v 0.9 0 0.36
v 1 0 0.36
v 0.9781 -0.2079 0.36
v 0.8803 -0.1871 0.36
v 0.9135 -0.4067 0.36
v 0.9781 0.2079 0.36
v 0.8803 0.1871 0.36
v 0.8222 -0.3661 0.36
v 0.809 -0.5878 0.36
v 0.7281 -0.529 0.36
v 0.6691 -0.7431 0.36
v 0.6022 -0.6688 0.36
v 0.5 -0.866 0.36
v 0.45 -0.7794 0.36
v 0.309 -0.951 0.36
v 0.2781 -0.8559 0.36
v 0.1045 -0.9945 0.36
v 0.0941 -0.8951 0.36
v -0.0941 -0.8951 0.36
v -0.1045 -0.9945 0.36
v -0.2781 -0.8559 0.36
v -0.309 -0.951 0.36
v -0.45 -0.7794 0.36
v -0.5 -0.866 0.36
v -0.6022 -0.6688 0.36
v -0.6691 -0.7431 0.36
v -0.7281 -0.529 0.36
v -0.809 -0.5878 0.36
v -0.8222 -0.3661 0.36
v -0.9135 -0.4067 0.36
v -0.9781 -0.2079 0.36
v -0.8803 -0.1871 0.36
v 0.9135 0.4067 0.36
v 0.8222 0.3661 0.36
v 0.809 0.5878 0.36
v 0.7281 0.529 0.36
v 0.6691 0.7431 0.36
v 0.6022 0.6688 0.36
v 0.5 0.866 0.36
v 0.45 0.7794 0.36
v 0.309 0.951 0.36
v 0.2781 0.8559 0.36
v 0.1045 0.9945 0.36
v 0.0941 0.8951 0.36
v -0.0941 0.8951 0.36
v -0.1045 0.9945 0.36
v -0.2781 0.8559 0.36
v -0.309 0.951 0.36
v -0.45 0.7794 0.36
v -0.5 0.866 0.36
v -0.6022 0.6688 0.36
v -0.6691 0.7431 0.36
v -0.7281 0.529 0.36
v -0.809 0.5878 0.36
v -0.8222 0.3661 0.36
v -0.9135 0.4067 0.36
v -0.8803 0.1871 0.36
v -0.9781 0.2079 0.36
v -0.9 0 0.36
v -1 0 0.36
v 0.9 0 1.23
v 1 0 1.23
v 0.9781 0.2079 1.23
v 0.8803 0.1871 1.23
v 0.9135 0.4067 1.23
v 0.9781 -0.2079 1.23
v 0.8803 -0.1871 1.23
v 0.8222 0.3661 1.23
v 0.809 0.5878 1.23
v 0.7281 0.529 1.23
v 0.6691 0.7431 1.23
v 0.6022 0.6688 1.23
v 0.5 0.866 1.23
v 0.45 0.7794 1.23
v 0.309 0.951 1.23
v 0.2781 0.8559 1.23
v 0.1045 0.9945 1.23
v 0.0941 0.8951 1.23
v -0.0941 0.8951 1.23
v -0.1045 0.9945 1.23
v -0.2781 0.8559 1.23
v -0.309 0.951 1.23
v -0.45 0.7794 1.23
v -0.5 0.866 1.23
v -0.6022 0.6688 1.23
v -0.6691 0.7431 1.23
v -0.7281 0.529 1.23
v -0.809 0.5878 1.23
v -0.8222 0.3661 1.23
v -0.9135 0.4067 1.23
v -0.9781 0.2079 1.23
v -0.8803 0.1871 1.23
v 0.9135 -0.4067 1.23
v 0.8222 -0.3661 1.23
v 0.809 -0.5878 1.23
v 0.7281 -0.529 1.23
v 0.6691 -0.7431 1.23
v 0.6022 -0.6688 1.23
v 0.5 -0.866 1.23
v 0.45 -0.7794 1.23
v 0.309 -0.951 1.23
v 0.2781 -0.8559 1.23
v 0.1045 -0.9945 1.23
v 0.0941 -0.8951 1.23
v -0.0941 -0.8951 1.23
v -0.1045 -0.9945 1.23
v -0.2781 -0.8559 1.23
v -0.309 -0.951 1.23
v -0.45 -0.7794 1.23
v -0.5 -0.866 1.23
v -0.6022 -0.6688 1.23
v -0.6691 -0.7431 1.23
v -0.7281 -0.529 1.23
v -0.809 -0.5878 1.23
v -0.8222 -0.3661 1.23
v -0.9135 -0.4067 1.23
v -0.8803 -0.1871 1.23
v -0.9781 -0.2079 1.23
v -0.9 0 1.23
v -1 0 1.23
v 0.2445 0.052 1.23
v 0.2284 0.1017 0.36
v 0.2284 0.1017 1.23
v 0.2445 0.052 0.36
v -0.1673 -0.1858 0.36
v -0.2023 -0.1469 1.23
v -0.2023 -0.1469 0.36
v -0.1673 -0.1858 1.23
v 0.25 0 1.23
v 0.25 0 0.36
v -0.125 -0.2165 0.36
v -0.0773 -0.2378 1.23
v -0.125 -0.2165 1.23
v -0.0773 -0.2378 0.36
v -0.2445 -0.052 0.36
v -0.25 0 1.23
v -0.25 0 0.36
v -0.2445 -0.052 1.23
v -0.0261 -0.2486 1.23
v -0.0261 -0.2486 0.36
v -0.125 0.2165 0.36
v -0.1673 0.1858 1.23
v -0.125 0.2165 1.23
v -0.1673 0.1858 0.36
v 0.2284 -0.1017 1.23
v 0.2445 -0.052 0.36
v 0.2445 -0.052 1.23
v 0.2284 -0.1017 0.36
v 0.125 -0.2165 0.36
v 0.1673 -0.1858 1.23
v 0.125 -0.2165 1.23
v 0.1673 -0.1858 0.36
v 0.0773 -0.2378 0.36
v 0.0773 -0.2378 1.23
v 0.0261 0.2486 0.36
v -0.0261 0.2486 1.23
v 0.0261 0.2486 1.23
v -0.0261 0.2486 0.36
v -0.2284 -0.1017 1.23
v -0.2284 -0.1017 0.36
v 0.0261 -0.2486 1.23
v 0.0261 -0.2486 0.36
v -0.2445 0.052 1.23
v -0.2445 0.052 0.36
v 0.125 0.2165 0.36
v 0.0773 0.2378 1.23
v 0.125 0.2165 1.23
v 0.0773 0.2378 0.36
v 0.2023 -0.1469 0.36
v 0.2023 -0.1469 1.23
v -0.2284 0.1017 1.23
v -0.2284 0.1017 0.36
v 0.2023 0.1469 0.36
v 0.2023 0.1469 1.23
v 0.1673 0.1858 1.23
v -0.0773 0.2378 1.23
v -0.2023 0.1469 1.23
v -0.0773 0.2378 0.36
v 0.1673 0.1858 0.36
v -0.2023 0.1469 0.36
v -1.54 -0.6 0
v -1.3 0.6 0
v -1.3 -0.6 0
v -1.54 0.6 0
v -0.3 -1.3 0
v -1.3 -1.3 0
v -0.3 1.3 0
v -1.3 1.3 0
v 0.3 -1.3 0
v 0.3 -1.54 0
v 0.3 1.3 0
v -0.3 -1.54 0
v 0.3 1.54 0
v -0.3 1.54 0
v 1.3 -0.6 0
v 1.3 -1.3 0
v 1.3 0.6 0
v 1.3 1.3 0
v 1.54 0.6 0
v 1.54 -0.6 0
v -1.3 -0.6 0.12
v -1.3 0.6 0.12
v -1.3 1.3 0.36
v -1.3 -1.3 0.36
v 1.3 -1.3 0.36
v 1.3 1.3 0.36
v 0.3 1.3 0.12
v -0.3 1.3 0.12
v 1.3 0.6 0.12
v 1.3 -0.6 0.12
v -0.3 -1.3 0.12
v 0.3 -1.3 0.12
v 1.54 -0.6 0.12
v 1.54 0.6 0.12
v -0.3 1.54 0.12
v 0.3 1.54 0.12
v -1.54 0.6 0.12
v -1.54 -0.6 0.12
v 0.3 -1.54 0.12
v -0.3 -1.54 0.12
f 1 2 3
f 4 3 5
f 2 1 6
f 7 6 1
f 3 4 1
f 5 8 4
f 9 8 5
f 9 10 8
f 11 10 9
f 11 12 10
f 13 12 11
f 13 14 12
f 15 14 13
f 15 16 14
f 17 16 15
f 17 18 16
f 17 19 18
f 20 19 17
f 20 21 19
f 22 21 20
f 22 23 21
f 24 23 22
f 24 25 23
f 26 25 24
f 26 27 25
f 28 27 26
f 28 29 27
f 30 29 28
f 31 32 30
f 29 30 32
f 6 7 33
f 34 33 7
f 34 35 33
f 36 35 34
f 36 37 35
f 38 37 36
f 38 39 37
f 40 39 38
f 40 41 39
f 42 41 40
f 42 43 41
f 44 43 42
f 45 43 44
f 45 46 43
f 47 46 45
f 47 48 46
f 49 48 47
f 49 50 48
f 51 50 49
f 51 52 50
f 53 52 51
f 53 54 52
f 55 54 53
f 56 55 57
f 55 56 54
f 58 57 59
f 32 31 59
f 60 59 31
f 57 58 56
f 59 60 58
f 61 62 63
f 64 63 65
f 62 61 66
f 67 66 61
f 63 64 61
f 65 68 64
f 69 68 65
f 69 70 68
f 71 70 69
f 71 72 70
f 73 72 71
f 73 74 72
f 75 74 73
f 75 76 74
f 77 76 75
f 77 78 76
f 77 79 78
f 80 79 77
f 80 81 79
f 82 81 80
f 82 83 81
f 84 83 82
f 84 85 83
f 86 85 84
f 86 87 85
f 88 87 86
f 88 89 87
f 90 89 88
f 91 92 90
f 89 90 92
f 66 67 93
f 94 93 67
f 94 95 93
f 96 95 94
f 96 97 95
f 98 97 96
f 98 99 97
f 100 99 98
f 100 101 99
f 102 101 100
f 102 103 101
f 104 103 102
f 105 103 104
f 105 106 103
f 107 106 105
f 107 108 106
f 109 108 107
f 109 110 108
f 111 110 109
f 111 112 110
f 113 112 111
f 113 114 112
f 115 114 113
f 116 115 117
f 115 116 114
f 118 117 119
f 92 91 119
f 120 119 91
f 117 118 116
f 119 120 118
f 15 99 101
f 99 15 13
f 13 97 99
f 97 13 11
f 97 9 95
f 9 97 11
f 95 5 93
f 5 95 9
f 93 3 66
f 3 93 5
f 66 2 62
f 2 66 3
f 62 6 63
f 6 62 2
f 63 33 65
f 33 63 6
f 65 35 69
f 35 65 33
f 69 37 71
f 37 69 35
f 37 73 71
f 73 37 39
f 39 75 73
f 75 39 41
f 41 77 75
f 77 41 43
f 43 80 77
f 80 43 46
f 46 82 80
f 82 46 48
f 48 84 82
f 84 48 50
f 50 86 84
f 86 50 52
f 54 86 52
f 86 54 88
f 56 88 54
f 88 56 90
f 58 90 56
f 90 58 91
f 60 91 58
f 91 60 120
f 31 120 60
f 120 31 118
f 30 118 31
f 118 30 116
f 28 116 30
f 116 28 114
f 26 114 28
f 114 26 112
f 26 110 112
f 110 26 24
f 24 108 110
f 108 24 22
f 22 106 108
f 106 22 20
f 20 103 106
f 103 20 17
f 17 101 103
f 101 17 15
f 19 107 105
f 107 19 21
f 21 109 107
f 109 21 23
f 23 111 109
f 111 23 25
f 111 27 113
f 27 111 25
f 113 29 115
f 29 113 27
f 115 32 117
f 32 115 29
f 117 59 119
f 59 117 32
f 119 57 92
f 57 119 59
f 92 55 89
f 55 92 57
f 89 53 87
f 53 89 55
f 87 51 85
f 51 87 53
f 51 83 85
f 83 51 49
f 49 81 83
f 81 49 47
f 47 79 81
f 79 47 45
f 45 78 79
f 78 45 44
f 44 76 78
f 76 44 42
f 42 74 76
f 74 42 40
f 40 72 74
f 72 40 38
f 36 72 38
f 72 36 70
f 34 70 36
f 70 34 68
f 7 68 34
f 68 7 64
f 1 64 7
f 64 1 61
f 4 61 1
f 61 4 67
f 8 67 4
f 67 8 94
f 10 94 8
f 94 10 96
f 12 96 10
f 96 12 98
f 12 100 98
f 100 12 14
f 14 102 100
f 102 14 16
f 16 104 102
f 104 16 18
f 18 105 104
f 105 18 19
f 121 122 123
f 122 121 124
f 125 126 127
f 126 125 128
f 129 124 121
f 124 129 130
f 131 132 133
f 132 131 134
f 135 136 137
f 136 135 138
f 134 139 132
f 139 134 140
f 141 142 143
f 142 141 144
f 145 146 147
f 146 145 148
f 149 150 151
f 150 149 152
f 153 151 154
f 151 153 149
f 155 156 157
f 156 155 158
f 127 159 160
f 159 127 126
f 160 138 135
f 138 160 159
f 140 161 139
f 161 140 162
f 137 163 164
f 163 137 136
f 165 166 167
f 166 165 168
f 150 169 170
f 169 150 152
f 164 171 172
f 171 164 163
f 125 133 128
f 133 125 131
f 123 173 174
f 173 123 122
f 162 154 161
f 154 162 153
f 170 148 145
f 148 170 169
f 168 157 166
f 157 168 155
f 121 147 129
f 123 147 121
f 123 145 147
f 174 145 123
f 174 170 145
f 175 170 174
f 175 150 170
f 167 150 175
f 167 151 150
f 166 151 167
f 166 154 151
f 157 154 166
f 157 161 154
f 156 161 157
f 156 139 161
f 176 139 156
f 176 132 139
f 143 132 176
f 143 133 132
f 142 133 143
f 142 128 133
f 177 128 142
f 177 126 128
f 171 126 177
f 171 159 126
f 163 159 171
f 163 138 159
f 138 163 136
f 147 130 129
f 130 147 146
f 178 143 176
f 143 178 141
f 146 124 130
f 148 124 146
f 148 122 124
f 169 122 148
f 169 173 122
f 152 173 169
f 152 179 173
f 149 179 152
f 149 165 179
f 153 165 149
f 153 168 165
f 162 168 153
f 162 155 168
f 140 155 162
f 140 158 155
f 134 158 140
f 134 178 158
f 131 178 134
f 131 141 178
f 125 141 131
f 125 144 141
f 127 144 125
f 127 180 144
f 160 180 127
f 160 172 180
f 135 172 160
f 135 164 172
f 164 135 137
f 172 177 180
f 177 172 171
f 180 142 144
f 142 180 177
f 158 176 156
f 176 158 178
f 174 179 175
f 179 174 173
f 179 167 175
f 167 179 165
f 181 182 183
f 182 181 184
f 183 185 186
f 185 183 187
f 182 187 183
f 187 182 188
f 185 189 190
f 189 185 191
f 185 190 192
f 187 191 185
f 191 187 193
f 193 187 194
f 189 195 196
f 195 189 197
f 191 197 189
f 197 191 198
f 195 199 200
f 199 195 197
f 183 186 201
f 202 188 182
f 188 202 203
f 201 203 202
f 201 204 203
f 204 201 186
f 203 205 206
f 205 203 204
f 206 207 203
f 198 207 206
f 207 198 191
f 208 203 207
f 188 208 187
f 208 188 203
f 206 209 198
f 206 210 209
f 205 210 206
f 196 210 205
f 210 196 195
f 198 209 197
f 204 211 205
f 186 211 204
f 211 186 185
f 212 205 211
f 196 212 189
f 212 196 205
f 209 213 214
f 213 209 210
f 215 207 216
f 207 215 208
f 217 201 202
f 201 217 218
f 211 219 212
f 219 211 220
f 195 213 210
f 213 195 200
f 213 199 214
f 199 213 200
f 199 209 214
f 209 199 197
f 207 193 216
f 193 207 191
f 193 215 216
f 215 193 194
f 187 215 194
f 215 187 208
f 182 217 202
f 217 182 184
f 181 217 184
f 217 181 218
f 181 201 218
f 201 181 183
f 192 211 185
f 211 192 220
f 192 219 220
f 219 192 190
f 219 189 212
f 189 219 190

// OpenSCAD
// Values taken from datasheet
// https://www.tme.eu/Document/82c09d7fbe22b420f67191e83ce17977/MX-73412-0110.pdf

CHASSIS_X_LENGTH = 2.6;
CHASSIS_Y_LENGTH =  2.6;
CHASSIS_Z_LENGTH = 0.36;

PAD_HEIGHT = 0.12;

CONNECTIOR_OUT_RING_RADIUS = 1.0;
CONNECTIOR_OUT_RING_WIDTH = 0.1;
CONNECTOR_INNER_RING_PIN_RADIUS = 0.25;

CONNECTOR_HEIGHT = 1.23 - CHASSIS_Z_LENGTH;


// Not very importnat values, no info in datasheet

// empty

// Increase steps in render to have quality circles
$fs=0.01;


module Chassis(){    
    linear_extrude(height = CHASSIS_Z_LENGTH, convexity = 10, twist = 0)  
        square([CHASSIS_X_LENGTH, CHASSIS_Y_LENGTH], center=true);
}

module outterRing(){
    linear_extrude(height = CONNECTOR_HEIGHT, convexity = 10, twist = 0)
        difference(){
            circle(r=CONNECTIOR_OUT_RING_RADIUS);
            circle(r=CONNECTIOR_OUT_RING_RADIUS - CONNECTIOR_OUT_RING_WIDTH);
        }
}

module innerRing()
{
    linear_extrude(height = CONNECTOR_HEIGHT, convexity = 10, twist = 0)
        circle(r=CONNECTOR_INNER_RING_PIN_RADIUS);
}

module Pads()
{
    PAD_TO_CENTER = 3.08/2;

    
    linear_extrude(height = PAD_HEIGHT, convexity = 10, twist = 0){
        polygon([[-0.3, PAD_TO_CENTER], [0.3, PAD_TO_CENTER],
                 [0.3, -PAD_TO_CENTER], [-0.3, -PAD_TO_CENTER]]);

        polygon([[PAD_TO_CENTER, -0.6], [PAD_TO_CENTER, 0.6],
                 [-PAD_TO_CENTER, 0.6], [-PAD_TO_CENTER, -0.6]]);
    }
}


//

module Connector(){
    Chassis();
    Pads();
    translate([0, 0, CHASSIS_Z_LENGTH]){
        outterRing();
        innerRing();
    }
}
 Pads();
Connector();


/*
module screw(centerX){
    translate([0, 0, CHASSIS_Z_LENGTH-SCREW_Z_DEEPNES])
        linear_extrude(height = SCREW_Z_DEEPNES, convexity = 10, twist = 0)
                translate([centerX, SCREW_TO_EDGE_Y_DISTANCE, 0])
                    circle(r=SCREW_RADIUS);
}

module cableMounting(centerX){
    translate([centerX - MOUNTING_CABLE_SIZE/2, 0, MOUNTING_CABLE_TO_Y_OFFSET])
        linear_extrude(height = MOUNTING_CABLE_SIZE, convexity = 10, twist = 0)
            square([MOUNTING_CABLE_SIZE, MOUNTING_CABLE_SIZE]);
}

    difference(){
        Chassis();

        // loop alow to modify component to have more than two connectors
        for(nodeXPlace = [2.5, 7.5])   
            union(){            
                screw(nodeXPlace);
                cableMounting(nodeXPlace);
            }
    }
*/
